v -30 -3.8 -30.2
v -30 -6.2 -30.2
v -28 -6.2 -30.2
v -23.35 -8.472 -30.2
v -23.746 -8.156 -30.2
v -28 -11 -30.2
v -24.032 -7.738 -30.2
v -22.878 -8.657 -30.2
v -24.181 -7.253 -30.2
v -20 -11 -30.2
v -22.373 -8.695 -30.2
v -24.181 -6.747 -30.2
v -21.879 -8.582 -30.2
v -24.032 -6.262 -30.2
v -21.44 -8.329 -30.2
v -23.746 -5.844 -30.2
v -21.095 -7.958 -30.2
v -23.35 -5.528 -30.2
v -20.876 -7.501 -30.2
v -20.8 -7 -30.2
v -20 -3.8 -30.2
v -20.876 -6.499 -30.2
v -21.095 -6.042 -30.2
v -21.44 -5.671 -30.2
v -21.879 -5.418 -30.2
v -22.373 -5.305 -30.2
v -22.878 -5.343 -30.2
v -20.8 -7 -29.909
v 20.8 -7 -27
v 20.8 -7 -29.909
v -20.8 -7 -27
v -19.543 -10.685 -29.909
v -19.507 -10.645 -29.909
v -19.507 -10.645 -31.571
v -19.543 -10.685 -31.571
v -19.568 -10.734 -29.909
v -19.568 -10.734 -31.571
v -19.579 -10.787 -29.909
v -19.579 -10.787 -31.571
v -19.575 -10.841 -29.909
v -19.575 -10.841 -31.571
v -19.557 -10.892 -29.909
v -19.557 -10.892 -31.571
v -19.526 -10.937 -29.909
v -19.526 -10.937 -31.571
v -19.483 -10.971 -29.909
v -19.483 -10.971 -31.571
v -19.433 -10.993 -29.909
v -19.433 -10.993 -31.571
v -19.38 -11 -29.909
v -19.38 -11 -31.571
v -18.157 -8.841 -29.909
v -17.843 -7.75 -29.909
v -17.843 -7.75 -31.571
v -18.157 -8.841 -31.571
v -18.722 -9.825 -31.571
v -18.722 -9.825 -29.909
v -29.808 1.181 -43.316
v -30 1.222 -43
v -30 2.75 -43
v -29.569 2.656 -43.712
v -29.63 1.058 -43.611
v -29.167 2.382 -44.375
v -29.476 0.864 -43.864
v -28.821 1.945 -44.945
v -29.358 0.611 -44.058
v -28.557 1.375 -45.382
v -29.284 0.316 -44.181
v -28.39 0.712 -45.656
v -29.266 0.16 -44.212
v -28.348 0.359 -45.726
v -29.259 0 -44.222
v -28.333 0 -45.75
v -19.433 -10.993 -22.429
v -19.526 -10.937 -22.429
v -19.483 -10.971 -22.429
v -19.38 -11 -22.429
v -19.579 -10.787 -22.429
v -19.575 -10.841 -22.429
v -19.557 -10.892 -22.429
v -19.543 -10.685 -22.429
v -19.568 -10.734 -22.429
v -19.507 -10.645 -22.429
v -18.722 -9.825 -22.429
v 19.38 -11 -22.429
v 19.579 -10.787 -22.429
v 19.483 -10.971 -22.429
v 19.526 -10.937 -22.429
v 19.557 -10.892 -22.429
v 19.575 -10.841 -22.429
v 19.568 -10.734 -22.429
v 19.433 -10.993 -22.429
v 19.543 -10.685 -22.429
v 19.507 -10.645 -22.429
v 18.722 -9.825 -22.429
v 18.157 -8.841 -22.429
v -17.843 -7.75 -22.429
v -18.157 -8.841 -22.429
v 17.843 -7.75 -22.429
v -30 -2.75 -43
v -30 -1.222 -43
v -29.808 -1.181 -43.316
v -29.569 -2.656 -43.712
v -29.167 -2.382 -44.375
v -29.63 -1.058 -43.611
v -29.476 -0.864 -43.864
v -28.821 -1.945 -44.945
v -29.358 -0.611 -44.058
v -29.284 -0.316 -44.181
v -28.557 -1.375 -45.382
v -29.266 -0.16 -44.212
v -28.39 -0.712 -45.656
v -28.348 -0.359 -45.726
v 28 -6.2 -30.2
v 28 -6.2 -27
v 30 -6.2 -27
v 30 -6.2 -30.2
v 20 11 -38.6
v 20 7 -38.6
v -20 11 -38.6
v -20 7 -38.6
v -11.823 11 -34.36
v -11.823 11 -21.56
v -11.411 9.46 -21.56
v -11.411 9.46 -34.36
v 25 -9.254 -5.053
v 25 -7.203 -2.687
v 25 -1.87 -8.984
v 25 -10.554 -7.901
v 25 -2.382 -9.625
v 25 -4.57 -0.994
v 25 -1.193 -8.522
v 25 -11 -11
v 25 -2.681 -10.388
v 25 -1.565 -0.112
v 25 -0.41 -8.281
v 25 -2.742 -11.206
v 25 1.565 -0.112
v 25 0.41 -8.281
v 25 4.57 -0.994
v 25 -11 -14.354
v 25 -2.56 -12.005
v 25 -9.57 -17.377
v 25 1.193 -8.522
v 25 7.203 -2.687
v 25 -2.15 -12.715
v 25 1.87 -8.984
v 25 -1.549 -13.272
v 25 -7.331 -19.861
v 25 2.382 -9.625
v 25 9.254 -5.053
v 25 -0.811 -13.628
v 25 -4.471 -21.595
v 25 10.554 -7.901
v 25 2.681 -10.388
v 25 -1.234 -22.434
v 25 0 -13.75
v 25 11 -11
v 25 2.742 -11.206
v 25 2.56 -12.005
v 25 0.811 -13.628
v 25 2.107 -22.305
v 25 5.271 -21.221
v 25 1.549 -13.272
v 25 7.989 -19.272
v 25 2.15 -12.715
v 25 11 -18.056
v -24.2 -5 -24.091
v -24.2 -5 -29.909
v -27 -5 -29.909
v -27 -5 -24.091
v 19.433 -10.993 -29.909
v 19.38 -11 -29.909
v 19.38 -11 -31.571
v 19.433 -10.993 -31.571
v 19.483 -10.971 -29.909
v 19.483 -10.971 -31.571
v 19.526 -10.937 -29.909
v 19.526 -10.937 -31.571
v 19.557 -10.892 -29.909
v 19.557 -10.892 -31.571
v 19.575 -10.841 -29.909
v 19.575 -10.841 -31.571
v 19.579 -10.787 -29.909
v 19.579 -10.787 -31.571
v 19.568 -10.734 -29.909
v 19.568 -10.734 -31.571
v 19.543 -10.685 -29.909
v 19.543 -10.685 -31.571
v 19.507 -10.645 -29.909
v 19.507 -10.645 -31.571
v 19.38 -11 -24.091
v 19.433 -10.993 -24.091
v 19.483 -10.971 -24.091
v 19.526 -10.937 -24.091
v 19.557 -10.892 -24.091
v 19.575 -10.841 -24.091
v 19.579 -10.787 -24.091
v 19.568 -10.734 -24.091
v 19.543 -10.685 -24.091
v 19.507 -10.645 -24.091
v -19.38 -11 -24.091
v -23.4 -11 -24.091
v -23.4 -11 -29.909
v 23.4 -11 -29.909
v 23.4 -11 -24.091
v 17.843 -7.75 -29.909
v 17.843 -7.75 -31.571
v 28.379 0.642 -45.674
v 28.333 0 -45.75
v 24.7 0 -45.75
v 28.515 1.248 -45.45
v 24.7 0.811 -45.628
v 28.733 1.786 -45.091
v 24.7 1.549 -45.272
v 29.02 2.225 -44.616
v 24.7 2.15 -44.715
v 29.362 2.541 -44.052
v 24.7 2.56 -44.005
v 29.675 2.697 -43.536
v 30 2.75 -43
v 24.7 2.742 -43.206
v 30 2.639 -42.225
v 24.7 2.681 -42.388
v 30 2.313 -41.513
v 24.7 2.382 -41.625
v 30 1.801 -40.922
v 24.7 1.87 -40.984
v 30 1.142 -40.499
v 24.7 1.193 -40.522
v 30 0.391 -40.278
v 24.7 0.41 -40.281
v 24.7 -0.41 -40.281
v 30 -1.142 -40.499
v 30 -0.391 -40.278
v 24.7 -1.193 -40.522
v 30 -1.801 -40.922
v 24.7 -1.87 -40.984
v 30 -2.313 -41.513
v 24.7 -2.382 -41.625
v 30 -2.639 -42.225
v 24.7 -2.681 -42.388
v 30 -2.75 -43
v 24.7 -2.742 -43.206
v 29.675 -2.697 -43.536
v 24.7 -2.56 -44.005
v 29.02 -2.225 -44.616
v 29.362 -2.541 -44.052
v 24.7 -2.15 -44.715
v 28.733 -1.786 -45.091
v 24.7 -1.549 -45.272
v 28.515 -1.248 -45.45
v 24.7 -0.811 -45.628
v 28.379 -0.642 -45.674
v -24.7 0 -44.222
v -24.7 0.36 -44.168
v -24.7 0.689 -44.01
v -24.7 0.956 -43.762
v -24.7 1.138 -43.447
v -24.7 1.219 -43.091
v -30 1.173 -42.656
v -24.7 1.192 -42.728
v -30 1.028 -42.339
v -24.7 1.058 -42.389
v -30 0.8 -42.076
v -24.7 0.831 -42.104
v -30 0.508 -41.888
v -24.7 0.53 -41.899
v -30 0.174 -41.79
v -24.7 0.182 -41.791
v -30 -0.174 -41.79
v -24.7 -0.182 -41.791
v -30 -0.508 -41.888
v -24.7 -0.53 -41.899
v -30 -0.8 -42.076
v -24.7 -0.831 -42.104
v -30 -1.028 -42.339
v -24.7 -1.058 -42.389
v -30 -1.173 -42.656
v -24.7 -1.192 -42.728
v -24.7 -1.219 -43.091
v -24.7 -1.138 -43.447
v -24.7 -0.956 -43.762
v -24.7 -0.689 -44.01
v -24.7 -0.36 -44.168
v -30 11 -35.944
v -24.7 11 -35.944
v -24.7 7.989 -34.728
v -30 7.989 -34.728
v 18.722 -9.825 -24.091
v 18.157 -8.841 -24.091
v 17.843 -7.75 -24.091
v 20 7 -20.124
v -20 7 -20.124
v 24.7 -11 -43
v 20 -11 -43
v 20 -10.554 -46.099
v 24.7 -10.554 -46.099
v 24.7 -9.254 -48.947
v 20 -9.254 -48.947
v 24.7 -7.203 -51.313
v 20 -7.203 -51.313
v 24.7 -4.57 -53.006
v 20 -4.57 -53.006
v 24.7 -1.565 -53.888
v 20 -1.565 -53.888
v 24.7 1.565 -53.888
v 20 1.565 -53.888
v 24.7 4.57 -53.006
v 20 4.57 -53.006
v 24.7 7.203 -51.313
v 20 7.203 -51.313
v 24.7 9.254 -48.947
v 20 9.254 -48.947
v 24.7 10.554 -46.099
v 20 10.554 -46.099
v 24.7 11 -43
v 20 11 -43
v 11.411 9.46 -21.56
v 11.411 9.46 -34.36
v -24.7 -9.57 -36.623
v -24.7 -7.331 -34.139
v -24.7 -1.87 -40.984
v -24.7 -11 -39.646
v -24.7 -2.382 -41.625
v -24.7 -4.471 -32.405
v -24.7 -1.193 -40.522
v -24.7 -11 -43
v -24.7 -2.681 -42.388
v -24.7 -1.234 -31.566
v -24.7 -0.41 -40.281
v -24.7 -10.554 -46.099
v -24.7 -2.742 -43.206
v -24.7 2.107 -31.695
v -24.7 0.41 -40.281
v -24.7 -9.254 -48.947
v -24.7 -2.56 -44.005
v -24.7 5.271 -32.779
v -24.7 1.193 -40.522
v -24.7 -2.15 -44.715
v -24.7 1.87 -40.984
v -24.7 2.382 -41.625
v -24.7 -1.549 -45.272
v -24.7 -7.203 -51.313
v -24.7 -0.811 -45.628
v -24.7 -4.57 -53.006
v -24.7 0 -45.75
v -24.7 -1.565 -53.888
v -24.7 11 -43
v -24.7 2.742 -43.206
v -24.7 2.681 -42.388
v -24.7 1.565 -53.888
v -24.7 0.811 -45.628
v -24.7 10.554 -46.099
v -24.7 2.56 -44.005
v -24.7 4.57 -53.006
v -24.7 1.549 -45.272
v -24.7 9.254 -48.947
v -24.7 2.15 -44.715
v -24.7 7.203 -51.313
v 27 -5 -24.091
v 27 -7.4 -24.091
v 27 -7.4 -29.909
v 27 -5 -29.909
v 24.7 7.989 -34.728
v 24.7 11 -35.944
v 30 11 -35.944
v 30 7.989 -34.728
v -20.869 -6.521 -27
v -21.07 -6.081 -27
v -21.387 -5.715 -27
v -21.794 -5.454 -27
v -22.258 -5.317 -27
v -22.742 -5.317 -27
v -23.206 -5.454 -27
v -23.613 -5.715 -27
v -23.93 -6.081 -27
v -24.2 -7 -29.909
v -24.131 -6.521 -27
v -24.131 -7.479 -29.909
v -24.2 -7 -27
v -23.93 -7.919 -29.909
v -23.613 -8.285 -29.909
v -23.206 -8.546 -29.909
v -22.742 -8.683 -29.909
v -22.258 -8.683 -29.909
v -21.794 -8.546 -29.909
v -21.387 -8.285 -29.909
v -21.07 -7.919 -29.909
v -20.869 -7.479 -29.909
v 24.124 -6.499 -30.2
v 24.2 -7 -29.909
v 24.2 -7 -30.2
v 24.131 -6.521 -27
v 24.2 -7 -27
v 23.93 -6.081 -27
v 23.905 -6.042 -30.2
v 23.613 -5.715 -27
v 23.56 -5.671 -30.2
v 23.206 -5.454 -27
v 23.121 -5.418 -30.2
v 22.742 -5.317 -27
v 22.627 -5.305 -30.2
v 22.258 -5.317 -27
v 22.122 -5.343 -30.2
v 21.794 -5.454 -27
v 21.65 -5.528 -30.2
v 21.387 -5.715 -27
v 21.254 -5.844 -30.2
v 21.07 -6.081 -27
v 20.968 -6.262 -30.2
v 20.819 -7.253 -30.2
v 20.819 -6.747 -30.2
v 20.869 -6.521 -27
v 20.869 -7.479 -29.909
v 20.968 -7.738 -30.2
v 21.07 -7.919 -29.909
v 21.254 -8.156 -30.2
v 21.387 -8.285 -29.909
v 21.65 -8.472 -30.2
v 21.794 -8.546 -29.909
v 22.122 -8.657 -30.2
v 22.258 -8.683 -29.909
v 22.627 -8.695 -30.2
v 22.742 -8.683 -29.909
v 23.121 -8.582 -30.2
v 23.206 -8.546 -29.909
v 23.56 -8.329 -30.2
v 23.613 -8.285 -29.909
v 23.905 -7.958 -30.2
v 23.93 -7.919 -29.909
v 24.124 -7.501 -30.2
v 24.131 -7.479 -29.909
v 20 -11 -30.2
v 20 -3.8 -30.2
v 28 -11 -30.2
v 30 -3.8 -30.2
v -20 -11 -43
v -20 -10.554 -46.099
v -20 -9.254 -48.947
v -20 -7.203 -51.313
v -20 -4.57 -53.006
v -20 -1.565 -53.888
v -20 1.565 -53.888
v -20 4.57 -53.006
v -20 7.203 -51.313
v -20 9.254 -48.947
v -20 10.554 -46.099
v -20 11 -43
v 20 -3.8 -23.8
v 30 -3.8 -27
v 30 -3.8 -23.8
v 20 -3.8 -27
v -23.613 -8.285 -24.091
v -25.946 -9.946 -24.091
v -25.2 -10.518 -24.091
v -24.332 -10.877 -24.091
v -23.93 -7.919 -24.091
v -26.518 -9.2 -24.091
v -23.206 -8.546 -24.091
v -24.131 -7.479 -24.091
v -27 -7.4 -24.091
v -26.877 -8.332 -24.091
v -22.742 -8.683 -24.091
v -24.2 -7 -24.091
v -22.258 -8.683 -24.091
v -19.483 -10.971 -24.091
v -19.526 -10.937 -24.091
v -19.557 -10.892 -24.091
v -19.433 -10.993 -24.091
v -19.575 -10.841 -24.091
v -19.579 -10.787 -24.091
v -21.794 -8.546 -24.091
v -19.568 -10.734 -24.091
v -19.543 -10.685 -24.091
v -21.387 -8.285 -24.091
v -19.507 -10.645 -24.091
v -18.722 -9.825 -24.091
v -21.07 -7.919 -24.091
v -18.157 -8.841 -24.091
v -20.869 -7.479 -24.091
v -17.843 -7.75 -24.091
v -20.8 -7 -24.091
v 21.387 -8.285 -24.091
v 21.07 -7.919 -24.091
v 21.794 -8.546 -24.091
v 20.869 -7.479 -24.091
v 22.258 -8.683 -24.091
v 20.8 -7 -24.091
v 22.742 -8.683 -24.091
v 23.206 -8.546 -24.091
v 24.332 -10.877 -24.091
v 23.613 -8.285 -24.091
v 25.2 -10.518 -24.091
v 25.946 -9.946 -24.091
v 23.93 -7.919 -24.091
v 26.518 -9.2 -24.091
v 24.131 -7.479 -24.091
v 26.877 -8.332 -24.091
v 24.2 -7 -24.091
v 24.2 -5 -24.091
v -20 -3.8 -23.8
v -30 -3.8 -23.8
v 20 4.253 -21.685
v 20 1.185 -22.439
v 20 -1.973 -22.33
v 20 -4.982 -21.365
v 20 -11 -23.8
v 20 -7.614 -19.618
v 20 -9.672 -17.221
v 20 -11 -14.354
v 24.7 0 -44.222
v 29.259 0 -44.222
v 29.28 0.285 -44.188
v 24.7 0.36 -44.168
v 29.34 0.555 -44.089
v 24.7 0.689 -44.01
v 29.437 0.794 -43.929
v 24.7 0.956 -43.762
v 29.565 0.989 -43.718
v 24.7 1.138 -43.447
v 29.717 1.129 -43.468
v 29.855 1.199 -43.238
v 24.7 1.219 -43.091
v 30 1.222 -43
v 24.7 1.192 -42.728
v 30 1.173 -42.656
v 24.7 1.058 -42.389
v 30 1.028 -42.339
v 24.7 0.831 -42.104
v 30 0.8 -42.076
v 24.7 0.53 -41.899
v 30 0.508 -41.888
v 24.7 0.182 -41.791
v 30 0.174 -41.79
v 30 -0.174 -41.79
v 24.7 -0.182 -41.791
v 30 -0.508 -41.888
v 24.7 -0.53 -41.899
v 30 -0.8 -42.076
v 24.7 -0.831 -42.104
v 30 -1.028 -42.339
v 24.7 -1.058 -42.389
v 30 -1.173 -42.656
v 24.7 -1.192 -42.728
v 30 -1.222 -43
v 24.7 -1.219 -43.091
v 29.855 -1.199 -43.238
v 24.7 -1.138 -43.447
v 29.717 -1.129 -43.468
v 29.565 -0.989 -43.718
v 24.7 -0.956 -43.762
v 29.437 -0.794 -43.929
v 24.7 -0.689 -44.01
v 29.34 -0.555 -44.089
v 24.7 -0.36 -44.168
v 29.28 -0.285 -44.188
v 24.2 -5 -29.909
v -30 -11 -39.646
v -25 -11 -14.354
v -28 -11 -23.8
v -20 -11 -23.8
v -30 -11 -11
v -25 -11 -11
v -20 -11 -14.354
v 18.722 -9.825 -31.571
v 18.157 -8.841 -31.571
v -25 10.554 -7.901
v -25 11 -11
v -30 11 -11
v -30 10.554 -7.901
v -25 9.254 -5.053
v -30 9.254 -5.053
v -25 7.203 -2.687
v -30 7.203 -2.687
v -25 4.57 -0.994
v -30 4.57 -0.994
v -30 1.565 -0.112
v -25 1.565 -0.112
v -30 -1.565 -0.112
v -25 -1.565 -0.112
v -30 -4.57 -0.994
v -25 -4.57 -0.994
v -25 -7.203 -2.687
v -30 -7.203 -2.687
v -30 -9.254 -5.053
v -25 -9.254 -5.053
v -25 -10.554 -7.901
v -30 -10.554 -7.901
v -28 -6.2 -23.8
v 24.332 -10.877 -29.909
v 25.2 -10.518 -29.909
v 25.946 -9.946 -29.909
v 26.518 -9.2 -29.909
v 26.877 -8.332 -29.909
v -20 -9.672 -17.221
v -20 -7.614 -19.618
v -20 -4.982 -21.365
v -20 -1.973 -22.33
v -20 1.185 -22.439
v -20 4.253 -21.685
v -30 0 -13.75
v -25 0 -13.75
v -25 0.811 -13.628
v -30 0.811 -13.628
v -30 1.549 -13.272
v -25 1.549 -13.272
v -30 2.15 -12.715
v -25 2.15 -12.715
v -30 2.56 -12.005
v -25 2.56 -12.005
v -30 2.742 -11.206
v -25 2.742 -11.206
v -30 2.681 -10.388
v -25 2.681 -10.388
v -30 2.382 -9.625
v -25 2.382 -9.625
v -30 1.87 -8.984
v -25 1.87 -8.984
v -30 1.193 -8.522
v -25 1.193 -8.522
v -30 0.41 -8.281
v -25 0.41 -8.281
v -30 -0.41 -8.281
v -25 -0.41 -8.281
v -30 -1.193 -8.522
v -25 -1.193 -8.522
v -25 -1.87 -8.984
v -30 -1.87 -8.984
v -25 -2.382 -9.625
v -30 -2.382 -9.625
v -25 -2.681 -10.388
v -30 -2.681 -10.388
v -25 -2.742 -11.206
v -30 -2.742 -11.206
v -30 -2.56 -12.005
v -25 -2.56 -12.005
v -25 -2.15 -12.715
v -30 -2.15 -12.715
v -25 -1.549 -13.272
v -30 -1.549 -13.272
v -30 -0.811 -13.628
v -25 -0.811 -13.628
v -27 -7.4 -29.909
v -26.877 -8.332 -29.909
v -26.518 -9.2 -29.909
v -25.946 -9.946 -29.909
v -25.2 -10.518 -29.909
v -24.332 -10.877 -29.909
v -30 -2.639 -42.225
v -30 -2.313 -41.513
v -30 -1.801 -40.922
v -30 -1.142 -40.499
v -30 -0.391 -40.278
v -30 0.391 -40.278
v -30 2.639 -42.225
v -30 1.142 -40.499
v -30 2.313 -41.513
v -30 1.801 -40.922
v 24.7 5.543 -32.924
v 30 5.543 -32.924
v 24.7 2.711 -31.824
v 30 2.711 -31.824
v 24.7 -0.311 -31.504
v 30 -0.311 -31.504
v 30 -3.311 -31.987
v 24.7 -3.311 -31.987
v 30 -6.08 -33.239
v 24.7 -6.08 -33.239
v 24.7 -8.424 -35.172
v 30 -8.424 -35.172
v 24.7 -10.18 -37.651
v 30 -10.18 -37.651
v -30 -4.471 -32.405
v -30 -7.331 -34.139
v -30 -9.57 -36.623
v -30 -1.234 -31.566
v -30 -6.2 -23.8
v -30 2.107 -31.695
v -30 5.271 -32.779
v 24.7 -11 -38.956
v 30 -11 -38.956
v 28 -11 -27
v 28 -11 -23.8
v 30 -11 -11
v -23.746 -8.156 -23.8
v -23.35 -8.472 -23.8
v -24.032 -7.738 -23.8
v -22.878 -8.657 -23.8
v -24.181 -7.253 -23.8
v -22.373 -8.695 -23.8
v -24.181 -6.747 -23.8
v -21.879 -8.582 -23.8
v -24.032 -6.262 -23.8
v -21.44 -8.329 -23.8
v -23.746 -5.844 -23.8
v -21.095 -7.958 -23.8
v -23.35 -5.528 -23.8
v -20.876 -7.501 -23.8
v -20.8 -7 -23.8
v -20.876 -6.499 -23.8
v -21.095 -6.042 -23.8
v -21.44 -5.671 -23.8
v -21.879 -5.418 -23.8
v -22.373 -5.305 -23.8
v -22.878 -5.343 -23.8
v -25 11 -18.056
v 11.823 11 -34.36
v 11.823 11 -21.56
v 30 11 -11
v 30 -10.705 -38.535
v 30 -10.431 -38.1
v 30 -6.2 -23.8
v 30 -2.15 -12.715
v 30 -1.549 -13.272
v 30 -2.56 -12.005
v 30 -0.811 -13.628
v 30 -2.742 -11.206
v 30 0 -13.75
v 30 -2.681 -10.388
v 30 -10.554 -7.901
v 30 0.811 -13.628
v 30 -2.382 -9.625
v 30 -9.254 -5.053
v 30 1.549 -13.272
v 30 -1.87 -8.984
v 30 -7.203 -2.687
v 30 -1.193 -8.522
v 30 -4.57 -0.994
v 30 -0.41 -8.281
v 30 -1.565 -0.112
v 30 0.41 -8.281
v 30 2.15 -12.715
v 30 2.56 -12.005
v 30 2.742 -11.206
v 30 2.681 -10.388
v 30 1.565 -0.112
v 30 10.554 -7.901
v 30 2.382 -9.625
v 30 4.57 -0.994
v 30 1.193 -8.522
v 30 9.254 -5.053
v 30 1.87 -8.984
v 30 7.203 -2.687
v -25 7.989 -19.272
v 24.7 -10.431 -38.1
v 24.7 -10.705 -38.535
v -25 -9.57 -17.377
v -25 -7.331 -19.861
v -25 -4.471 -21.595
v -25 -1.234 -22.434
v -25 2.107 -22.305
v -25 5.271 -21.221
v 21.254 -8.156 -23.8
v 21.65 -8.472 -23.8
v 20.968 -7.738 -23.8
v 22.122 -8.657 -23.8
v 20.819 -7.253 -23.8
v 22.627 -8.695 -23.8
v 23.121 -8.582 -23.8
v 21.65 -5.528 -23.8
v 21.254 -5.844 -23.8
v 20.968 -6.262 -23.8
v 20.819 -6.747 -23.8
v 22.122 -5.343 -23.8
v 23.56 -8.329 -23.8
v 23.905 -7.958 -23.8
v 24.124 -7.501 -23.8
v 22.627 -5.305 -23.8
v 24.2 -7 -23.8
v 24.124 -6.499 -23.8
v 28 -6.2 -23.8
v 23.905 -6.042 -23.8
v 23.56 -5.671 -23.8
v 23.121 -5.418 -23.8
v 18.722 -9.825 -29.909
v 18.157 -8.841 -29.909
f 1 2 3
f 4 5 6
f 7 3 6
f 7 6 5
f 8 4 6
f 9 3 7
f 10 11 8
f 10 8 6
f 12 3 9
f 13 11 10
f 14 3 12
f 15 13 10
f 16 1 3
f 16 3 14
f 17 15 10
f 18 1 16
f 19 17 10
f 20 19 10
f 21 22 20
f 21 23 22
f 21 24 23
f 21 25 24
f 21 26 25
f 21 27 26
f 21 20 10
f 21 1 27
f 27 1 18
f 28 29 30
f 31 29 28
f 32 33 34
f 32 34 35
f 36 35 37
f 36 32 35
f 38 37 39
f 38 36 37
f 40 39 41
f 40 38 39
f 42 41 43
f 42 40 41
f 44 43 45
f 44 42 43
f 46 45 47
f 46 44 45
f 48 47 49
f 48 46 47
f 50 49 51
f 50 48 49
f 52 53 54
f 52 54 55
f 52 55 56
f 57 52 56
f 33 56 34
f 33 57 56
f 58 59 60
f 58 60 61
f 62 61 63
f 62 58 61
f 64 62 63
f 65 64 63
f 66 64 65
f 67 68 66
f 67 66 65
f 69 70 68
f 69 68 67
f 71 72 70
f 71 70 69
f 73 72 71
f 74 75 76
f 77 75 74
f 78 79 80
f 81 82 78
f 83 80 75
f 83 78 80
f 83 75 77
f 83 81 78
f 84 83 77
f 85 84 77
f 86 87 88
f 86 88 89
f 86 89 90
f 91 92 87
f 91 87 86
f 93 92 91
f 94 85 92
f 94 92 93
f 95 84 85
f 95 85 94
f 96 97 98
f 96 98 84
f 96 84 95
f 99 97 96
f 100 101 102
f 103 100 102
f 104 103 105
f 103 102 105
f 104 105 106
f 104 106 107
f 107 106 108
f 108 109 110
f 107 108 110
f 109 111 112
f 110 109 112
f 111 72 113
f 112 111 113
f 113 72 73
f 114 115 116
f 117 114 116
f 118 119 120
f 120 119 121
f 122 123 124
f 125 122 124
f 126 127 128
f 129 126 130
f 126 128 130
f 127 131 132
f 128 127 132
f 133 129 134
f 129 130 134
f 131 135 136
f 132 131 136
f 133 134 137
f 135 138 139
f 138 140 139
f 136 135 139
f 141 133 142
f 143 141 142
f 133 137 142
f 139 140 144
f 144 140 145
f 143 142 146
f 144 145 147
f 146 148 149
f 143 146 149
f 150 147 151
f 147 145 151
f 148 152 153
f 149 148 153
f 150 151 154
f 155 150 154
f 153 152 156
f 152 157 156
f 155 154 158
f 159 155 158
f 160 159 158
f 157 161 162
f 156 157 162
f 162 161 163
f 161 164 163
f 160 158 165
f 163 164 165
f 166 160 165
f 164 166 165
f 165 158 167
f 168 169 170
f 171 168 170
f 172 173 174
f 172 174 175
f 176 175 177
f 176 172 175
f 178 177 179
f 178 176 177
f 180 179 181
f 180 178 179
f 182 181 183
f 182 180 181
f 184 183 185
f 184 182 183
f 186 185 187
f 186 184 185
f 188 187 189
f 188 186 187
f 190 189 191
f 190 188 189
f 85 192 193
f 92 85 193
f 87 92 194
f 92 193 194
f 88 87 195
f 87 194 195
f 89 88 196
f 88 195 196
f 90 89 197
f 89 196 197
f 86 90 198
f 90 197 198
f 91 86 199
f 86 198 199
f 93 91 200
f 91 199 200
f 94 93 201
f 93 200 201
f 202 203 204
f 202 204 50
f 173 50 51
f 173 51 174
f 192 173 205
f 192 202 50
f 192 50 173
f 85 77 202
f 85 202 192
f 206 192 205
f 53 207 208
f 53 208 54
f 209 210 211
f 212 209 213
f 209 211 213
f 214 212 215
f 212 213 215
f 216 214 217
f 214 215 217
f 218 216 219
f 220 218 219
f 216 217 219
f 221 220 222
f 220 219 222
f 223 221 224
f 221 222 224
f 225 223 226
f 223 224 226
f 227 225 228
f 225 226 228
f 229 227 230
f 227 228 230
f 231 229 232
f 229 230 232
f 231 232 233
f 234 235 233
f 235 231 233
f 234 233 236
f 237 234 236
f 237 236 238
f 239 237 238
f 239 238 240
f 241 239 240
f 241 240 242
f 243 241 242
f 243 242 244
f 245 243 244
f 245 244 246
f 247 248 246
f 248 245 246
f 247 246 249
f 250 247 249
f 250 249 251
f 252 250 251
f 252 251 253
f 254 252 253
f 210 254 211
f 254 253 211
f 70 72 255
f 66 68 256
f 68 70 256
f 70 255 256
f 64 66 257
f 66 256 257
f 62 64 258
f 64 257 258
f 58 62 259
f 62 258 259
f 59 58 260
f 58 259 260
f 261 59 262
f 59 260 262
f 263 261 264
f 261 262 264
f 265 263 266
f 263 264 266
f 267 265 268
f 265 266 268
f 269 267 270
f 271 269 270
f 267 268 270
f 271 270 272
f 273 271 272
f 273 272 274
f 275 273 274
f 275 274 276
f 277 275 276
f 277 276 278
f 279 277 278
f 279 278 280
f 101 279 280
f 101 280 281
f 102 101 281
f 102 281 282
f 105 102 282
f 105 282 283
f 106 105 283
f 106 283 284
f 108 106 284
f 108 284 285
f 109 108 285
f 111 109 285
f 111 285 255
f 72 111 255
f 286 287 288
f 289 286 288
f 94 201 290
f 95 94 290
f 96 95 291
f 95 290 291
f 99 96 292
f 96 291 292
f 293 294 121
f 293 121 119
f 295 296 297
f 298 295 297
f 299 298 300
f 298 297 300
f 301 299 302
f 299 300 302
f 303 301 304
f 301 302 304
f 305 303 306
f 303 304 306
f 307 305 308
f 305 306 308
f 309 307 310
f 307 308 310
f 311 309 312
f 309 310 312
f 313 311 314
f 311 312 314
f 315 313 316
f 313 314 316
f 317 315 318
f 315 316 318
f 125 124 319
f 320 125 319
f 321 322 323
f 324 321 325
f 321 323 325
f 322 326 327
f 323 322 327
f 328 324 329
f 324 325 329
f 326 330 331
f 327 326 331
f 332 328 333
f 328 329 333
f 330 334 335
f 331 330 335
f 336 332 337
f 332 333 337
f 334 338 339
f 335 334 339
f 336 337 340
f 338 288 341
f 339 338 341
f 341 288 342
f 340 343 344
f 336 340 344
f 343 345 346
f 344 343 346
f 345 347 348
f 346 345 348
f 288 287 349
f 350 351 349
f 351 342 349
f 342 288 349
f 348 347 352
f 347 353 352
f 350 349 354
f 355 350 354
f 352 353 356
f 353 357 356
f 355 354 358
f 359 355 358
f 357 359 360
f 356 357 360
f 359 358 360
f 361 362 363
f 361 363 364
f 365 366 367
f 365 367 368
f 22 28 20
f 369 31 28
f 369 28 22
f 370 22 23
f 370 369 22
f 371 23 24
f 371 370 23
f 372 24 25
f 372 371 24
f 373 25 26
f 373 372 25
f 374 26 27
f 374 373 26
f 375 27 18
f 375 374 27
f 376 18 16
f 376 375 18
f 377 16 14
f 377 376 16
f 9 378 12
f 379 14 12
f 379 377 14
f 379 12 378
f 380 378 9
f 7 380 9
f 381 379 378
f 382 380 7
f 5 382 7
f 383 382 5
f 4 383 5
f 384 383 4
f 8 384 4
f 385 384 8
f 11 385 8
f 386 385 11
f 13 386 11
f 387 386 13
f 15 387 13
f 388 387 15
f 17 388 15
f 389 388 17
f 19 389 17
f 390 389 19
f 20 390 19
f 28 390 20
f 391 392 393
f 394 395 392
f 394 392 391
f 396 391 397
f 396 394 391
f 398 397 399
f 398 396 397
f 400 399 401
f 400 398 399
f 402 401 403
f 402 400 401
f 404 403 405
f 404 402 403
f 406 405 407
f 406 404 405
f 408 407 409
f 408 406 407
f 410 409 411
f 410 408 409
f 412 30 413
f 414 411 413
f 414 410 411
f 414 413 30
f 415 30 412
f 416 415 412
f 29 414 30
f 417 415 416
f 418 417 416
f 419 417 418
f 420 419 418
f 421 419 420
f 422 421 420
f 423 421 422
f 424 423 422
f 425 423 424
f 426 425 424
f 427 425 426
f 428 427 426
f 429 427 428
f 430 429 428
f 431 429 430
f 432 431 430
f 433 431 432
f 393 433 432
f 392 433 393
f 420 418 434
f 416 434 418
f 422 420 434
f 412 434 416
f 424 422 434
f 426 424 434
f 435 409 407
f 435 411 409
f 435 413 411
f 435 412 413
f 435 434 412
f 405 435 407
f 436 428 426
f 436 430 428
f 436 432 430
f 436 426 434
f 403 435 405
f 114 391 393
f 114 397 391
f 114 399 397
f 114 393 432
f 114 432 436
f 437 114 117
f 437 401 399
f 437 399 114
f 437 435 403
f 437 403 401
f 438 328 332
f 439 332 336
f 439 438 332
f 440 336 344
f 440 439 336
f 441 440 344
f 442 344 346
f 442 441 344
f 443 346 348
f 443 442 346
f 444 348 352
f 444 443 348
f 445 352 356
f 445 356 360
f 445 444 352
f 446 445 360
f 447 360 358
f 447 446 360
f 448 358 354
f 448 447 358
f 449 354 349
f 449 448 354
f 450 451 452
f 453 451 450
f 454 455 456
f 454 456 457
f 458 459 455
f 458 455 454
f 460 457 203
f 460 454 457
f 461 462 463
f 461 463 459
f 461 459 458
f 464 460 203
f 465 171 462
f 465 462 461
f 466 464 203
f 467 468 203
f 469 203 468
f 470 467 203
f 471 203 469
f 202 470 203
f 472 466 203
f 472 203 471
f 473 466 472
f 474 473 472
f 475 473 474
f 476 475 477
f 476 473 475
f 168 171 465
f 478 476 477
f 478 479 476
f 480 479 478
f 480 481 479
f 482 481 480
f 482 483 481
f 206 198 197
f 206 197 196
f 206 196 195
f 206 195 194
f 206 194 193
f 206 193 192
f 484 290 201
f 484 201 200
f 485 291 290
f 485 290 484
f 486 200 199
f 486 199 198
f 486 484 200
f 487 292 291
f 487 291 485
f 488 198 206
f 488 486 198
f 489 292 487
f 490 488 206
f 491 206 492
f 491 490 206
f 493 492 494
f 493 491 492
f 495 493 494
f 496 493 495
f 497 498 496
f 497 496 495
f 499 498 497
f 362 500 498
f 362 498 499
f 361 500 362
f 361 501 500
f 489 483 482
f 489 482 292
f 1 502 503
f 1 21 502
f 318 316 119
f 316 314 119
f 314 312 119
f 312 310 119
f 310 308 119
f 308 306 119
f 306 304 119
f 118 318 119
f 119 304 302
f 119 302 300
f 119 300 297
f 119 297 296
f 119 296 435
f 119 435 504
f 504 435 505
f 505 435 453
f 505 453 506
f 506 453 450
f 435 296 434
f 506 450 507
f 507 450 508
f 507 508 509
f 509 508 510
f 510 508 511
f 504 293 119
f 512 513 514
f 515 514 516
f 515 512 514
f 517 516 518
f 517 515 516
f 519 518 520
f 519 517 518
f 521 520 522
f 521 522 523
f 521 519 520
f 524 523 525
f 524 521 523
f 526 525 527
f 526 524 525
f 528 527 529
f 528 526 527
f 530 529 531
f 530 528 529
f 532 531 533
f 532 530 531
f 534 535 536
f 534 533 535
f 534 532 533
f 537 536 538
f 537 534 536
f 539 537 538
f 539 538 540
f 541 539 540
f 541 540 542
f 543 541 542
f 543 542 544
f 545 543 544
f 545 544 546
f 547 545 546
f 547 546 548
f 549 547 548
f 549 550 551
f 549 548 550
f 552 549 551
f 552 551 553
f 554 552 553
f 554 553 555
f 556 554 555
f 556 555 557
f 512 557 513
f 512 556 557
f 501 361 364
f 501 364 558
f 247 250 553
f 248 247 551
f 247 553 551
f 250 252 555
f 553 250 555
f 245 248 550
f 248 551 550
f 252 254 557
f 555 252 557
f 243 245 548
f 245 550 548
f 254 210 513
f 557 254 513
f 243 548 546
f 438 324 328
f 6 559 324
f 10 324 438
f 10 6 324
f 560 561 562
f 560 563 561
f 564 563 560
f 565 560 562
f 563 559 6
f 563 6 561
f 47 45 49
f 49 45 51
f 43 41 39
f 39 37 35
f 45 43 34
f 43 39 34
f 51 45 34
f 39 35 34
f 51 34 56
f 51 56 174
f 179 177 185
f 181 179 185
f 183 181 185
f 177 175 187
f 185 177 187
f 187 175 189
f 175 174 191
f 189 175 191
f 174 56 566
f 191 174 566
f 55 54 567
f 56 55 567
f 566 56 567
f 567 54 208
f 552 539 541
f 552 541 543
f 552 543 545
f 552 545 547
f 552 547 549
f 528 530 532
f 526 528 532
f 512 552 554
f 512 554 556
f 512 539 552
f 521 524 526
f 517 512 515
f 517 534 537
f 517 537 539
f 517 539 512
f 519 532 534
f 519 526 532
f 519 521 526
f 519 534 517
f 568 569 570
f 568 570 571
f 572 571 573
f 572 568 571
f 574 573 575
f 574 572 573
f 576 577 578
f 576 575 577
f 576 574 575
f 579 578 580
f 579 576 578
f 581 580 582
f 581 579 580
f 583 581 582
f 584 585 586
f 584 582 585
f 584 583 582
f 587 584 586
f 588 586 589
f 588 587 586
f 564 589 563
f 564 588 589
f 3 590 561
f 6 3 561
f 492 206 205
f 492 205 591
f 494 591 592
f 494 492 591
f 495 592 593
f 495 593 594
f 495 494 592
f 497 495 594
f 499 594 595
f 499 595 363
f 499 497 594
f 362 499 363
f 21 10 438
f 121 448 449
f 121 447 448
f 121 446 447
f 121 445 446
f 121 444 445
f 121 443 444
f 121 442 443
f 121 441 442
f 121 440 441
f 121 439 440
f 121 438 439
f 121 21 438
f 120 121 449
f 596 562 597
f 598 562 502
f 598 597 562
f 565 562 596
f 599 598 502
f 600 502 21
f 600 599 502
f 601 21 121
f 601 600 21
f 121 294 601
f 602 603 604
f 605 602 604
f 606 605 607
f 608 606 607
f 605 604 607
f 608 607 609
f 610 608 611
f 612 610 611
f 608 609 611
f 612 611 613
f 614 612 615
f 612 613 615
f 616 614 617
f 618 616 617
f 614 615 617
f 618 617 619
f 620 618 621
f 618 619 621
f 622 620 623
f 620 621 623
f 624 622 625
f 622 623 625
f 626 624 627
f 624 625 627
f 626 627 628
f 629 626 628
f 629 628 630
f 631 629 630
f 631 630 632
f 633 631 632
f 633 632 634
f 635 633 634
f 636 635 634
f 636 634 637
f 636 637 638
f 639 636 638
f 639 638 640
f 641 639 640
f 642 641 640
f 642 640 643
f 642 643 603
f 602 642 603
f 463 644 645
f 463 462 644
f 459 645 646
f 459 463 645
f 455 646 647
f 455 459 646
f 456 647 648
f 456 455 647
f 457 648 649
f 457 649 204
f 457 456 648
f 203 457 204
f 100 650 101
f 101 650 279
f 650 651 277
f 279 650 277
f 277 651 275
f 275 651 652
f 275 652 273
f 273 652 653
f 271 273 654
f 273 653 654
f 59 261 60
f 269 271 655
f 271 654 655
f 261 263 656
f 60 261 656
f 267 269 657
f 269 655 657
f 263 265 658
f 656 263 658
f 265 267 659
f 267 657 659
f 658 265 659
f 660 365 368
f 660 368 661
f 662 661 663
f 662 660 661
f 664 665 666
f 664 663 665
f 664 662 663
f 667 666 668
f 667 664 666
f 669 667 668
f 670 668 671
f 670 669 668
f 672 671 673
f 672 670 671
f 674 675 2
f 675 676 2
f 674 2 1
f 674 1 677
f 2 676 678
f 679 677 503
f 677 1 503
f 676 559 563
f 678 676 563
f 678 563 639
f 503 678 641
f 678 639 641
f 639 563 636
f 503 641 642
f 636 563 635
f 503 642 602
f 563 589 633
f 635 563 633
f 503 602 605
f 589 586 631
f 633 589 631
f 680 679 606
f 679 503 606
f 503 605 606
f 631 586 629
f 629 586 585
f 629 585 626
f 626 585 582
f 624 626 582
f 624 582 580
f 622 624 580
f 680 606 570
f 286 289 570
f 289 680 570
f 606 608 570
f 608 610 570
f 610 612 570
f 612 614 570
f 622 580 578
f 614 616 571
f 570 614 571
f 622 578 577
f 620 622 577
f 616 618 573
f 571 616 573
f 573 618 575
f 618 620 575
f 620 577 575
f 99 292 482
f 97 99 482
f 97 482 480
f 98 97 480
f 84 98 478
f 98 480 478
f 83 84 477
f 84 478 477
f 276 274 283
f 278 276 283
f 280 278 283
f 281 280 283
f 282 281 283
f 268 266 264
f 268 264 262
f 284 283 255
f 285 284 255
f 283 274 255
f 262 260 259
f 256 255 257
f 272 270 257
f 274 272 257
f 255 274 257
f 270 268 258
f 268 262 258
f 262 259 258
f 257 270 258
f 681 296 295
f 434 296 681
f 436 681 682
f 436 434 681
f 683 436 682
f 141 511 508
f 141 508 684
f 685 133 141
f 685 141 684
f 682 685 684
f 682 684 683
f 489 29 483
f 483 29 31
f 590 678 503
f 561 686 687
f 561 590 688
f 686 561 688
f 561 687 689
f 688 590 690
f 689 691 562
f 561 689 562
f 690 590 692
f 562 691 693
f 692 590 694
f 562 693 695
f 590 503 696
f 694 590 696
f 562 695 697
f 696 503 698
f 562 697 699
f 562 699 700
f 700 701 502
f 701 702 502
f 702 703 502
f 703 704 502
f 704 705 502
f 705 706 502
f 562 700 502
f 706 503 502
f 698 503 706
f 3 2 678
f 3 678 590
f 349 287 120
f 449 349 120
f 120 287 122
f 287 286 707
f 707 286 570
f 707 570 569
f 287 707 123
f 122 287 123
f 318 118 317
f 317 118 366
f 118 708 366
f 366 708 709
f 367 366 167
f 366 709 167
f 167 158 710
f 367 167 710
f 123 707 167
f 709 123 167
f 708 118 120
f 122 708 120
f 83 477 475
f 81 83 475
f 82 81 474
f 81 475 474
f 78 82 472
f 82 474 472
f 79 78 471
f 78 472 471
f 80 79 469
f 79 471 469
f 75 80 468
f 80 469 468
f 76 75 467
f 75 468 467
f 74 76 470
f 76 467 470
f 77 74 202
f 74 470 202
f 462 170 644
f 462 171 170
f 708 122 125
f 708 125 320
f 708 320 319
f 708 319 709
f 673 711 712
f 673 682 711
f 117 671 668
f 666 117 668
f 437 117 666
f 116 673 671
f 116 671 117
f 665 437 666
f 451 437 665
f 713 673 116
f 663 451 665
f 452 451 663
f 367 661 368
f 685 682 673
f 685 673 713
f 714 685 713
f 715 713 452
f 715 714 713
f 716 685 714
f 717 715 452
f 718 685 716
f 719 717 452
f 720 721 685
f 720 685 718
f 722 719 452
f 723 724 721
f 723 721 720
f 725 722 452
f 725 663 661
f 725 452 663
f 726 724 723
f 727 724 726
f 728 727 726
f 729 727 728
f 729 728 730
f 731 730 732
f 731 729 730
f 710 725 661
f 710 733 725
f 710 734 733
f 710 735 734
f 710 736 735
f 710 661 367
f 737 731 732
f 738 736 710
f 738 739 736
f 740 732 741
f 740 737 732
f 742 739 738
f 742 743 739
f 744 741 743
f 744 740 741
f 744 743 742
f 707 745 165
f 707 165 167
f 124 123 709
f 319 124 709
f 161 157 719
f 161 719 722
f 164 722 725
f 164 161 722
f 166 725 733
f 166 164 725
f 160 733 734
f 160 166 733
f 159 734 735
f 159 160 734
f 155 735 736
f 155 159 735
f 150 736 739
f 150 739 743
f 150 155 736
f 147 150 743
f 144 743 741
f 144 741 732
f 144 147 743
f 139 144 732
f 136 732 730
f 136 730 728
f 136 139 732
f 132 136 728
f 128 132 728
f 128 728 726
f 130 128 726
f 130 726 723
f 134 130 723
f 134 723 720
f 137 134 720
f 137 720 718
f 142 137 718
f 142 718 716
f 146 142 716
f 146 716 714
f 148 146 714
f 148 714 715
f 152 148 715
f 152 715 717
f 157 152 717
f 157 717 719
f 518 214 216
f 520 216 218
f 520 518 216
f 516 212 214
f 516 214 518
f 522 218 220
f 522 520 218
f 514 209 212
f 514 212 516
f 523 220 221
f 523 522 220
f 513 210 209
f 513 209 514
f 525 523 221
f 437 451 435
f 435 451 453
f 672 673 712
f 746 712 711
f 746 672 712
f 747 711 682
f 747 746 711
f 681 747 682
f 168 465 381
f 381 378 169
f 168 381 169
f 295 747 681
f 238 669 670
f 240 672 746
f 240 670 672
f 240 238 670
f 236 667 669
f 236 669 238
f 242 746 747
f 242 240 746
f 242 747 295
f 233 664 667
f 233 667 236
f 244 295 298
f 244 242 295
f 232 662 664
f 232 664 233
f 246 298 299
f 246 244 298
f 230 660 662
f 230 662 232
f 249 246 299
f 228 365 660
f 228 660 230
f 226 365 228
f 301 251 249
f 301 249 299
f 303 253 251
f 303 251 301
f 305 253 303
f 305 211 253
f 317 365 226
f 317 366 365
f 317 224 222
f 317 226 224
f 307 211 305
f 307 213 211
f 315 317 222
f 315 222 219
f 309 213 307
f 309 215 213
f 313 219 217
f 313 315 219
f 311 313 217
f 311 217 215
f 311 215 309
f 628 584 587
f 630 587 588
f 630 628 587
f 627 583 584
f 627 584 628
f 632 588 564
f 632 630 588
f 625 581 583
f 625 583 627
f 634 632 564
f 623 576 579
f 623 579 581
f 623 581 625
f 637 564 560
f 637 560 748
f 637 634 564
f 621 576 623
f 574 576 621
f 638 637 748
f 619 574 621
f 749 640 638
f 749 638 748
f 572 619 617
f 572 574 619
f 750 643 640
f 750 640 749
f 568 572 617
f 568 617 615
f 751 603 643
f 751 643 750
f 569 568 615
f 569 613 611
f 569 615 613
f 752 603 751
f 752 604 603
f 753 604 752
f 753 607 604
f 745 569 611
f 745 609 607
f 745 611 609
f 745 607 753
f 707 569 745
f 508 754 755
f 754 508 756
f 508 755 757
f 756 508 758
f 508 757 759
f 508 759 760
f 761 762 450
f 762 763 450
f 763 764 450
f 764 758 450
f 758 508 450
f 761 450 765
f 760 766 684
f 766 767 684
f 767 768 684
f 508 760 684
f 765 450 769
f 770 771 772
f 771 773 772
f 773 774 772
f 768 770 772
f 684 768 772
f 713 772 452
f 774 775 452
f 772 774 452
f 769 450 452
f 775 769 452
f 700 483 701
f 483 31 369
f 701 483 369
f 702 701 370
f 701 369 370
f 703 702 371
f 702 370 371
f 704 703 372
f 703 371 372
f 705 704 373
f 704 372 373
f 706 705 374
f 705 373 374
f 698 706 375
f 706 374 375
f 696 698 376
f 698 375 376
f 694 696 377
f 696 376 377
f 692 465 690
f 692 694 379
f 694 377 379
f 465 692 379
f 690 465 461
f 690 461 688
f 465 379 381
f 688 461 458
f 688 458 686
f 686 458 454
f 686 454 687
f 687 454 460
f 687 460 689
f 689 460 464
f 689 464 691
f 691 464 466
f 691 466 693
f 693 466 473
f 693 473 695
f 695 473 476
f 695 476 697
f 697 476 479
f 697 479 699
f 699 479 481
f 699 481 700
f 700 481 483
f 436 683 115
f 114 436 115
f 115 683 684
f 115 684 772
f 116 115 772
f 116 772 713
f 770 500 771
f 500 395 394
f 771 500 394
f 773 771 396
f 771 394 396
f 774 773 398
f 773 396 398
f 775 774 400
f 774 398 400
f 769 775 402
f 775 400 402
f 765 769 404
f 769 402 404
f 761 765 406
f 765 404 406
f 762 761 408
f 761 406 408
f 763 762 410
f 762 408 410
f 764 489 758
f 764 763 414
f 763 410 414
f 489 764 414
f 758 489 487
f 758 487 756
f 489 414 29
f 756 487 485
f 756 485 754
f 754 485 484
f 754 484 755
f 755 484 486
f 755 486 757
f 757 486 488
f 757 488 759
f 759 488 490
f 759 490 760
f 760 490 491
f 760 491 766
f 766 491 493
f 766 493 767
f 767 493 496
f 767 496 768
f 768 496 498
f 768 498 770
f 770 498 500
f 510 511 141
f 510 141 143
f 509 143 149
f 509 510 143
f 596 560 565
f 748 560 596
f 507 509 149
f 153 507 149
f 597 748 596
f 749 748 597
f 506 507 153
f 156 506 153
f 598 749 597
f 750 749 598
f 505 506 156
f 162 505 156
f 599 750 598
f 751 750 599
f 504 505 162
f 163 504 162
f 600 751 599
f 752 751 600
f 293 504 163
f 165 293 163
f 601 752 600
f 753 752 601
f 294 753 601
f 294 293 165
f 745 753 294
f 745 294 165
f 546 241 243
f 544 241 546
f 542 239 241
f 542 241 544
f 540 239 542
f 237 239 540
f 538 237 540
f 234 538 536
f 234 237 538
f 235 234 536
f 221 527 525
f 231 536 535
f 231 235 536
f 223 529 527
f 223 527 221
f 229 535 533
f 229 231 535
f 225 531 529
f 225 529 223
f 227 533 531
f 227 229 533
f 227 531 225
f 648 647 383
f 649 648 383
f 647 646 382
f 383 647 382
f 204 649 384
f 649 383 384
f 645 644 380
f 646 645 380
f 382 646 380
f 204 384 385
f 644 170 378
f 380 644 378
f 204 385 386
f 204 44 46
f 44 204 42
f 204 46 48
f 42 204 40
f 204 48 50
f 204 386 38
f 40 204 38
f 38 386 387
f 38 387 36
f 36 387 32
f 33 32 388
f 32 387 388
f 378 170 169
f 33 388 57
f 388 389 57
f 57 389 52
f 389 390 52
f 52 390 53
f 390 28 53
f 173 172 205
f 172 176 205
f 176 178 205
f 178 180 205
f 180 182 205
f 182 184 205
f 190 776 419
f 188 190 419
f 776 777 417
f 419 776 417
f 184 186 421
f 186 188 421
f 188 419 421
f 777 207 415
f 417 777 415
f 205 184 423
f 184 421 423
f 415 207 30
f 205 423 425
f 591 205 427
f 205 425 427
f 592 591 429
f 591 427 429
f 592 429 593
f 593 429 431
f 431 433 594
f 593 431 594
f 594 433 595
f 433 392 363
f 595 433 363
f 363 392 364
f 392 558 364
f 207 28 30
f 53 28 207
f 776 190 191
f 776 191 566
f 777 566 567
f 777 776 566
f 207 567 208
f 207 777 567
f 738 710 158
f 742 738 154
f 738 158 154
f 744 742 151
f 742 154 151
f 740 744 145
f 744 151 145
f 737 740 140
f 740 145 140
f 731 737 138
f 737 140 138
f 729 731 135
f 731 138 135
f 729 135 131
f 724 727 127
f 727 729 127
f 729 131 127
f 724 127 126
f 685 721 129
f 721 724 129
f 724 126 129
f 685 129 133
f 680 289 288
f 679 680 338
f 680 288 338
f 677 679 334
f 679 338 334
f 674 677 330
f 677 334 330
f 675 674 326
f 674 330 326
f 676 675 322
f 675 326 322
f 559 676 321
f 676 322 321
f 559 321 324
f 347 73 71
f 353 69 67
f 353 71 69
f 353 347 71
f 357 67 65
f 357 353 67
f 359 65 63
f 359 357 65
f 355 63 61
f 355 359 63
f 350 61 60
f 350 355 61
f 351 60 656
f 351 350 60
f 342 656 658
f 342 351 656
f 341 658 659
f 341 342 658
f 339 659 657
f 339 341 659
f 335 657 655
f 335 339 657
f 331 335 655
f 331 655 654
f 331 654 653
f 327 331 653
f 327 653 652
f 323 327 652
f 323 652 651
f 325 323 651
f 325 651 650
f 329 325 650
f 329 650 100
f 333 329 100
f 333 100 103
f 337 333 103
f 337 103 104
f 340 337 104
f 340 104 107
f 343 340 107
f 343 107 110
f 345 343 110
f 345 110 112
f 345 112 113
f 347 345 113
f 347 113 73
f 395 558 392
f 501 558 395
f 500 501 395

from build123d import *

# Parameters (mm, degrees)
SKETCH1_W                = 60
SKETCH1_H                = 22
BOSS_EXTRUDE1_DEPTH      = 54
CUT_EXTRUDE1_DEPTH       = 54
CUT_EXTRUDE1_DEPTH_BACK  = 54
SKETCH2_W                = 40
SKETCH2_H                = 18
CUT_EXTRUDE2_DEPTH       = 12.8
CUT_EXTRUDE3_DEPTH       = 54
CUT_EXTRUDE3_DEPTH_BACK  = 54
SKETCH4_W                = 120
SKETCH4_H                = 180
CUT_EXTRUDE4_DEPTH       = 30
CUT_EXTRUDE4_DEPTH_BACK  = 30
SKETCH5_W                = 96
SKETCH5_H                = 64
SKETCH6_R                = 2.75
CUT_EXTRUDE5_DEPTH       = 15
SKETCH7_R                = 1.222222222
CUT_EXTRUDE6_DEPTH       = 15
CUT_EXTRUDE7_DEPTH       = 30
CUT_EXTRUDE7_DEPTH_BACK  = 30
SKETCH8_R                = 2.75
CUT_EXTRUDE8_DEPTH       = 50
CUT_EXTRUDE9_START       = 15
SKETCH10_R               = 2.75
CUT_EXTRUDE9_DEPTH       = 15
CUT_EXTRUDE10_START      = 15
SKETCH11_R               = 1.222222222
CUT_EXTRUDE10_DEPTH      = 15
CUT_EXTRUDE11_DEPTH      = 3.2
CUT_EXTRUDE11_DEPTH_BACK = 3.2
SKETCH12_R               = 1.7
CUT_EXTRUDE12_DEPTH      = 3.2
CUT_EXTRUDE12_DEPTH_BACK = 3.2
SKETCH13_R               = 1.7
CUT_EXTRUDE13_DEPTH      = 2.75
CUT_EXTRUDE13_DEPTH_BACK = 2.75
CUT_EXTRUDE14_DEPTH      = 2.75
CUT_EXTRUDE14_DEPTH_BACK = 2.75
BOSS_EXTRUDE2_DEPTH      = 2.909090909
BOSS_EXTRUDE2_DEPTH_BACK = 2.909090909
BOSS_EXTRUDE3_DEPTH      = 4.571428571
BOSS_EXTRUDE3_DEPTH_BACK = 4.571428571


with BuildPart() as part:
    # Sketch1 → Boss-Extrude1 (new body)
    with BuildSketch(Plane.XY):
        Rectangle(SKETCH1_W, SKETCH1_H)
    extrude(amount=-BOSS_EXTRUDE1_DEPTH)

    # Sketch2 → Cut-Extrude1 (cut, two sides: drawn at the far end of the back side and taken through both)
    with BuildSketch(Plane.XY.offset(-CUT_EXTRUDE1_DEPTH_BACK)):
        with Locations((0, -2)):
            Rectangle(SKETCH2_W, SKETCH2_H)
    extrude(amount=CUT_EXTRUDE1_DEPTH + CUT_EXTRUDE1_DEPTH_BACK, mode=Mode.SUBTRACT)

    # Sketch3 → Cut-Extrude2 (cut)
    with BuildSketch(Plane.XY.offset(-21.56)):
        Polygon((-12, 11.66), (-11.410511777, 9.46), (11.410511777, 9.46), (12, 11.66), align=None)
    extrude(amount=-CUT_EXTRUDE2_DEPTH, mode=Mode.SUBTRACT)

    # Sketch4 → Cut-Extrude3 (cut, two sides: drawn at the far end of the back side and taken through both)
    with BuildSketch(Plane(origin=(0, 0, 0), x_dir=(-1, 0, 0), z_dir=(0, 1, 0)).offset(-CUT_EXTRUDE3_DEPTH_BACK)):
        with Locations((0, -30)):
            Rectangle(SKETCH4_W, SKETCH4_H)
        Polygon((30, -54), (30, 0), (20, 0), (20, -17.6), (-20, -17.6), (-20, 0), (-30, 0), (-30, -54), (-20, -54), (-20, -38.6), (20, -38.6), (20, -54), align=None, mode=Mode.SUBTRACT)
    extrude(amount=CUT_EXTRUDE3_DEPTH + CUT_EXTRUDE3_DEPTH_BACK, mode=Mode.SUBTRACT)

    # Sketch5 → Cut-Extrude4 (cut, two sides: drawn at the far end of the back side and taken through both)
    with BuildSketch(Plane(origin=(0, 0, 0), x_dir=(0, 0, -1), z_dir=(1, 0, 0)).offset(-CUT_EXTRUDE4_DEPTH_BACK)):
        with Locations((16, 0)):
            Rectangle(SKETCH5_W, SKETCH5_H)
        with BuildLine():
            Line((11, -11), (43, -11))
            ThreePointArc((43, -11), (54, 0), (43, 11))
            Line((43, 11), (11, 11))
            ThreePointArc((11, 11), (0, 0), (11, -11))
        make_face(mode=Mode.SUBTRACT)
    extrude(amount=CUT_EXTRUDE4_DEPTH + CUT_EXTRUDE4_DEPTH_BACK, mode=Mode.SUBTRACT)

    # Sketch6 → Cut-Extrude5 (cut)
    with BuildSketch(Plane(origin=(-24.7, 0, 0), x_dir=(0, 0, -1), z_dir=(1, 0, 0))):
        with BuildLine():
            Line((43, -11.5), (43, -38))
            Line((43, -38), (63.2, -38))
            Line((63.2, -38), (63.2, 41))
            Line((63.2, 41), (48.065075259, 41))
            Line((48.065075259, 41), (34.727592296, 7.98857126))
            ThreePointArc((34.727592296, 7.98857126), (32.414194185, -4.493407978), (43, -11.5))
        make_face()
        with Locations((43, 0)):
            Circle(SKETCH6_R, mode=Mode.SUBTRACT)
    extrude(amount=-CUT_EXTRUDE5_DEPTH, mode=Mode.SUBTRACT)

    # Sketch7 → Cut-Extrude6 (cut)
    with BuildSketch(Plane(origin=(-24.7, 0, 0), x_dir=(0, 0, -1), z_dir=(1, 0, 0))):
        with Locations((43, 0)):
            Circle(SKETCH7_R)
    extrude(amount=-CUT_EXTRUDE6_DEPTH, mode=Mode.SUBTRACT)

    # Sketch8 → Cut-Extrude7 (cut, two sides: drawn at the far end of the back side and taken through both)
    with BuildSketch(Plane(origin=(0, 0, 0), x_dir=(0, 0, -1), z_dir=(1, 0, 0)).offset(-CUT_EXTRUDE7_DEPTH_BACK)):
        with Locations((11, 0)):
            Circle(SKETCH8_R)
    extrude(amount=CUT_EXTRUDE7_DEPTH + CUT_EXTRUDE7_DEPTH_BACK, mode=Mode.SUBTRACT)

    # Sketch9 → Cut-Extrude8 (cut)
    with BuildSketch(Plane(origin=(-25, 0, 0), x_dir=(0, 0, -1), z_dir=(1, 0, 0))):
        with BuildLine():
            Line((-2.2, 26), (-2.2, -33))
            Line((-2.2, -33), (11, -33))
            Line((11, -33), (11, -11.5))
            ThreePointArc((11, -11.5), (21.585805815, -4.493407978), (19.272407704, 7.98857126))
            Line((19.272407704, 7.98857126), (11.995318128, 26))
            Line((11.995318128, 26), (-2.2, 26))
        make_face()
    extrude(amount=CUT_EXTRUDE8_DEPTH, mode=Mode.SUBTRACT)

    # Sketch10 → Cut-Extrude9 (cut)
    with BuildSketch(Plane(origin=(24.7, 0, 0), x_dir=(0, 0, -1), z_dir=(1, 0, 0)).offset(CUT_EXTRUDE9_START)):
        with BuildLine():
            Line((43, -19.032866311), (43, -38))
            Line((43, -38), (63.2, -38))
            Line((63.2, -38), (63.2, 41))
            Line((63.2, 41), (48.065075259, 41))
            Line((48.065075259, 41), (34.727592296, 7.98857126))
            ThreePointArc((34.727592296, 7.98857126), (31.646049671, -1.826967959), (37.651162791, -10.180370352))
            ThreePointArc((37.651162791, -10.180370352), (41.558961032, -13.861388181), (43, -19.032866311))
        make_face()
        with Locations((43, 0)):
            Circle(SKETCH10_R, mode=Mode.SUBTRACT)
    extrude(amount=-CUT_EXTRUDE9_DEPTH, mode=Mode.SUBTRACT)

    # Sketch11 → Cut-Extrude10 (cut)
    with BuildSketch(Plane(origin=(24.7, 0, 0), x_dir=(0, 0, -1), z_dir=(1, 0, 0)).offset(CUT_EXTRUDE10_START)):
        with Locations((43, 0)):
            Circle(SKETCH11_R)
    extrude(amount=-CUT_EXTRUDE10_DEPTH, mode=Mode.SUBTRACT)

    # Sketch12 → Cut-Extrude11 (cut, two sides: drawn at the far end of the back side and taken through both)
    with BuildSketch(Plane.XY.offset(-27).offset(-CUT_EXTRUDE11_DEPTH_BACK)):
        Polygon((-30, -6.2), (-28, -6.2), (-28, -11), (-20, -11), (-20, -3.8), (-30, -3.8), align=None)
        with Locations((-22.5, -7)):
            Circle(SKETCH12_R, mode=Mode.SUBTRACT)
    extrude(amount=CUT_EXTRUDE11_DEPTH + CUT_EXTRUDE11_DEPTH_BACK, mode=Mode.SUBTRACT)

    # Sketch13 → Cut-Extrude12 (cut, two sides: drawn at the far end of the back side and taken through both)
    with BuildSketch(Plane.XY.offset(-27).offset(-CUT_EXTRUDE12_DEPTH_BACK)):
        Polygon((20, -11), (28, -11), (28, -6.2), (30, -6.2), (30, -3.8), (20, -3.8), align=None)
        with Locations((22.5, -7)):
            Circle(SKETCH13_R, mode=Mode.SUBTRACT)
    extrude(amount=CUT_EXTRUDE12_DEPTH + CUT_EXTRUDE12_DEPTH_BACK, mode=Mode.SUBTRACT)

    # Sketch14 → Cut-Extrude13 (cut, two sides: drawn at the far end of the back side and taken through both)
    with BuildSketch(Plane(origin=(0, 0, 0), x_dir=(-1, 0, 0), z_dir=(0, 1, 0)).offset(-CUT_EXTRUDE13_DEPTH_BACK)):
        Polygon((-28.333333333, -45.75), (-30, -43), (-30, -45.75), align=None)
    extrude(amount=CUT_EXTRUDE13_DEPTH + CUT_EXTRUDE13_DEPTH_BACK, mode=Mode.SUBTRACT)

    # Sketch15 → Cut-Extrude14 (cut, two sides: drawn at the far end of the back side and taken through both)
    with BuildSketch(Plane(origin=(0, 0, 0), x_dir=(-1, 0, 0), z_dir=(0, 1, 0)).offset(-CUT_EXTRUDE14_DEPTH_BACK)):
        Polygon((30, -45.75), (30, -43), (28.333333333, -45.75), align=None)
    extrude(amount=CUT_EXTRUDE14_DEPTH + CUT_EXTRUDE14_DEPTH_BACK, mode=Mode.SUBTRACT)

    # Sketch16 → Boss-Extrude2 (add, two sides: drawn at the far end of the back side and taken through both)
    with BuildSketch(Plane.XY.offset(-27).offset(-BOSS_EXTRUDE2_DEPTH_BACK)):
        with BuildLine():
            Line((-23.4, -11), (23.4, -11))
            ThreePointArc((23.4, -11), (25.945584412, -9.945584412), (27, -7.4))
            Line((27, -7.4), (27, -5))
            Line((27, -5), (24.2, -5))
            Line((24.2, -5), (24.2, -7))
            ThreePointArc((24.2, -7), (22.5, -8.7), (20.8, -7))
            Line((20.8, -7), (-20.8, -7))
            ThreePointArc((-20.8, -7), (-22.5, -8.7), (-24.2, -7))
            Line((-24.2, -7), (-24.2, -5))
            Line((-24.2, -5), (-27, -5))
            Line((-27, -5), (-27, -7.4))
            ThreePointArc((-27, -7.4), (-25.945584412, -9.945584412), (-23.4, -11))
        make_face()
    extrude(amount=BOSS_EXTRUDE2_DEPTH + BOSS_EXTRUDE2_DEPTH_BACK)

    # Sketch17 → Boss-Extrude3 (add, two sides: drawn at the far end of the back side and taken through both)
    with BuildSketch(Plane.XY.offset(-27).offset(-BOSS_EXTRUDE3_DEPTH_BACK)):
        with BuildLine():
            Line((-19.379616013, -11), (19.379616013, -11))
            ThreePointArc((19.379616013, -11), (19.567915266, -10.867404682), (19.506538526, -10.645433911))
            ThreePointArc((19.506538526, -10.645433911), (18.409986139, -9.349848212), (17.843015997, -7.75))
            Line((17.843015997, -7.75), (-17.843015997, -7.75))
            ThreePointArc((-17.843015997, -7.75), (-18.409986139, -9.349848212), (-19.506538526, -10.645433911))
            ThreePointArc((-19.506538526, -10.645433911), (-19.567915266, -10.867404682), (-19.379616013, -11))
        make_face()
    extrude(amount=BOSS_EXTRUDE3_DEPTH + BOSS_EXTRUDE3_DEPTH_BACK)


solid = part.part
